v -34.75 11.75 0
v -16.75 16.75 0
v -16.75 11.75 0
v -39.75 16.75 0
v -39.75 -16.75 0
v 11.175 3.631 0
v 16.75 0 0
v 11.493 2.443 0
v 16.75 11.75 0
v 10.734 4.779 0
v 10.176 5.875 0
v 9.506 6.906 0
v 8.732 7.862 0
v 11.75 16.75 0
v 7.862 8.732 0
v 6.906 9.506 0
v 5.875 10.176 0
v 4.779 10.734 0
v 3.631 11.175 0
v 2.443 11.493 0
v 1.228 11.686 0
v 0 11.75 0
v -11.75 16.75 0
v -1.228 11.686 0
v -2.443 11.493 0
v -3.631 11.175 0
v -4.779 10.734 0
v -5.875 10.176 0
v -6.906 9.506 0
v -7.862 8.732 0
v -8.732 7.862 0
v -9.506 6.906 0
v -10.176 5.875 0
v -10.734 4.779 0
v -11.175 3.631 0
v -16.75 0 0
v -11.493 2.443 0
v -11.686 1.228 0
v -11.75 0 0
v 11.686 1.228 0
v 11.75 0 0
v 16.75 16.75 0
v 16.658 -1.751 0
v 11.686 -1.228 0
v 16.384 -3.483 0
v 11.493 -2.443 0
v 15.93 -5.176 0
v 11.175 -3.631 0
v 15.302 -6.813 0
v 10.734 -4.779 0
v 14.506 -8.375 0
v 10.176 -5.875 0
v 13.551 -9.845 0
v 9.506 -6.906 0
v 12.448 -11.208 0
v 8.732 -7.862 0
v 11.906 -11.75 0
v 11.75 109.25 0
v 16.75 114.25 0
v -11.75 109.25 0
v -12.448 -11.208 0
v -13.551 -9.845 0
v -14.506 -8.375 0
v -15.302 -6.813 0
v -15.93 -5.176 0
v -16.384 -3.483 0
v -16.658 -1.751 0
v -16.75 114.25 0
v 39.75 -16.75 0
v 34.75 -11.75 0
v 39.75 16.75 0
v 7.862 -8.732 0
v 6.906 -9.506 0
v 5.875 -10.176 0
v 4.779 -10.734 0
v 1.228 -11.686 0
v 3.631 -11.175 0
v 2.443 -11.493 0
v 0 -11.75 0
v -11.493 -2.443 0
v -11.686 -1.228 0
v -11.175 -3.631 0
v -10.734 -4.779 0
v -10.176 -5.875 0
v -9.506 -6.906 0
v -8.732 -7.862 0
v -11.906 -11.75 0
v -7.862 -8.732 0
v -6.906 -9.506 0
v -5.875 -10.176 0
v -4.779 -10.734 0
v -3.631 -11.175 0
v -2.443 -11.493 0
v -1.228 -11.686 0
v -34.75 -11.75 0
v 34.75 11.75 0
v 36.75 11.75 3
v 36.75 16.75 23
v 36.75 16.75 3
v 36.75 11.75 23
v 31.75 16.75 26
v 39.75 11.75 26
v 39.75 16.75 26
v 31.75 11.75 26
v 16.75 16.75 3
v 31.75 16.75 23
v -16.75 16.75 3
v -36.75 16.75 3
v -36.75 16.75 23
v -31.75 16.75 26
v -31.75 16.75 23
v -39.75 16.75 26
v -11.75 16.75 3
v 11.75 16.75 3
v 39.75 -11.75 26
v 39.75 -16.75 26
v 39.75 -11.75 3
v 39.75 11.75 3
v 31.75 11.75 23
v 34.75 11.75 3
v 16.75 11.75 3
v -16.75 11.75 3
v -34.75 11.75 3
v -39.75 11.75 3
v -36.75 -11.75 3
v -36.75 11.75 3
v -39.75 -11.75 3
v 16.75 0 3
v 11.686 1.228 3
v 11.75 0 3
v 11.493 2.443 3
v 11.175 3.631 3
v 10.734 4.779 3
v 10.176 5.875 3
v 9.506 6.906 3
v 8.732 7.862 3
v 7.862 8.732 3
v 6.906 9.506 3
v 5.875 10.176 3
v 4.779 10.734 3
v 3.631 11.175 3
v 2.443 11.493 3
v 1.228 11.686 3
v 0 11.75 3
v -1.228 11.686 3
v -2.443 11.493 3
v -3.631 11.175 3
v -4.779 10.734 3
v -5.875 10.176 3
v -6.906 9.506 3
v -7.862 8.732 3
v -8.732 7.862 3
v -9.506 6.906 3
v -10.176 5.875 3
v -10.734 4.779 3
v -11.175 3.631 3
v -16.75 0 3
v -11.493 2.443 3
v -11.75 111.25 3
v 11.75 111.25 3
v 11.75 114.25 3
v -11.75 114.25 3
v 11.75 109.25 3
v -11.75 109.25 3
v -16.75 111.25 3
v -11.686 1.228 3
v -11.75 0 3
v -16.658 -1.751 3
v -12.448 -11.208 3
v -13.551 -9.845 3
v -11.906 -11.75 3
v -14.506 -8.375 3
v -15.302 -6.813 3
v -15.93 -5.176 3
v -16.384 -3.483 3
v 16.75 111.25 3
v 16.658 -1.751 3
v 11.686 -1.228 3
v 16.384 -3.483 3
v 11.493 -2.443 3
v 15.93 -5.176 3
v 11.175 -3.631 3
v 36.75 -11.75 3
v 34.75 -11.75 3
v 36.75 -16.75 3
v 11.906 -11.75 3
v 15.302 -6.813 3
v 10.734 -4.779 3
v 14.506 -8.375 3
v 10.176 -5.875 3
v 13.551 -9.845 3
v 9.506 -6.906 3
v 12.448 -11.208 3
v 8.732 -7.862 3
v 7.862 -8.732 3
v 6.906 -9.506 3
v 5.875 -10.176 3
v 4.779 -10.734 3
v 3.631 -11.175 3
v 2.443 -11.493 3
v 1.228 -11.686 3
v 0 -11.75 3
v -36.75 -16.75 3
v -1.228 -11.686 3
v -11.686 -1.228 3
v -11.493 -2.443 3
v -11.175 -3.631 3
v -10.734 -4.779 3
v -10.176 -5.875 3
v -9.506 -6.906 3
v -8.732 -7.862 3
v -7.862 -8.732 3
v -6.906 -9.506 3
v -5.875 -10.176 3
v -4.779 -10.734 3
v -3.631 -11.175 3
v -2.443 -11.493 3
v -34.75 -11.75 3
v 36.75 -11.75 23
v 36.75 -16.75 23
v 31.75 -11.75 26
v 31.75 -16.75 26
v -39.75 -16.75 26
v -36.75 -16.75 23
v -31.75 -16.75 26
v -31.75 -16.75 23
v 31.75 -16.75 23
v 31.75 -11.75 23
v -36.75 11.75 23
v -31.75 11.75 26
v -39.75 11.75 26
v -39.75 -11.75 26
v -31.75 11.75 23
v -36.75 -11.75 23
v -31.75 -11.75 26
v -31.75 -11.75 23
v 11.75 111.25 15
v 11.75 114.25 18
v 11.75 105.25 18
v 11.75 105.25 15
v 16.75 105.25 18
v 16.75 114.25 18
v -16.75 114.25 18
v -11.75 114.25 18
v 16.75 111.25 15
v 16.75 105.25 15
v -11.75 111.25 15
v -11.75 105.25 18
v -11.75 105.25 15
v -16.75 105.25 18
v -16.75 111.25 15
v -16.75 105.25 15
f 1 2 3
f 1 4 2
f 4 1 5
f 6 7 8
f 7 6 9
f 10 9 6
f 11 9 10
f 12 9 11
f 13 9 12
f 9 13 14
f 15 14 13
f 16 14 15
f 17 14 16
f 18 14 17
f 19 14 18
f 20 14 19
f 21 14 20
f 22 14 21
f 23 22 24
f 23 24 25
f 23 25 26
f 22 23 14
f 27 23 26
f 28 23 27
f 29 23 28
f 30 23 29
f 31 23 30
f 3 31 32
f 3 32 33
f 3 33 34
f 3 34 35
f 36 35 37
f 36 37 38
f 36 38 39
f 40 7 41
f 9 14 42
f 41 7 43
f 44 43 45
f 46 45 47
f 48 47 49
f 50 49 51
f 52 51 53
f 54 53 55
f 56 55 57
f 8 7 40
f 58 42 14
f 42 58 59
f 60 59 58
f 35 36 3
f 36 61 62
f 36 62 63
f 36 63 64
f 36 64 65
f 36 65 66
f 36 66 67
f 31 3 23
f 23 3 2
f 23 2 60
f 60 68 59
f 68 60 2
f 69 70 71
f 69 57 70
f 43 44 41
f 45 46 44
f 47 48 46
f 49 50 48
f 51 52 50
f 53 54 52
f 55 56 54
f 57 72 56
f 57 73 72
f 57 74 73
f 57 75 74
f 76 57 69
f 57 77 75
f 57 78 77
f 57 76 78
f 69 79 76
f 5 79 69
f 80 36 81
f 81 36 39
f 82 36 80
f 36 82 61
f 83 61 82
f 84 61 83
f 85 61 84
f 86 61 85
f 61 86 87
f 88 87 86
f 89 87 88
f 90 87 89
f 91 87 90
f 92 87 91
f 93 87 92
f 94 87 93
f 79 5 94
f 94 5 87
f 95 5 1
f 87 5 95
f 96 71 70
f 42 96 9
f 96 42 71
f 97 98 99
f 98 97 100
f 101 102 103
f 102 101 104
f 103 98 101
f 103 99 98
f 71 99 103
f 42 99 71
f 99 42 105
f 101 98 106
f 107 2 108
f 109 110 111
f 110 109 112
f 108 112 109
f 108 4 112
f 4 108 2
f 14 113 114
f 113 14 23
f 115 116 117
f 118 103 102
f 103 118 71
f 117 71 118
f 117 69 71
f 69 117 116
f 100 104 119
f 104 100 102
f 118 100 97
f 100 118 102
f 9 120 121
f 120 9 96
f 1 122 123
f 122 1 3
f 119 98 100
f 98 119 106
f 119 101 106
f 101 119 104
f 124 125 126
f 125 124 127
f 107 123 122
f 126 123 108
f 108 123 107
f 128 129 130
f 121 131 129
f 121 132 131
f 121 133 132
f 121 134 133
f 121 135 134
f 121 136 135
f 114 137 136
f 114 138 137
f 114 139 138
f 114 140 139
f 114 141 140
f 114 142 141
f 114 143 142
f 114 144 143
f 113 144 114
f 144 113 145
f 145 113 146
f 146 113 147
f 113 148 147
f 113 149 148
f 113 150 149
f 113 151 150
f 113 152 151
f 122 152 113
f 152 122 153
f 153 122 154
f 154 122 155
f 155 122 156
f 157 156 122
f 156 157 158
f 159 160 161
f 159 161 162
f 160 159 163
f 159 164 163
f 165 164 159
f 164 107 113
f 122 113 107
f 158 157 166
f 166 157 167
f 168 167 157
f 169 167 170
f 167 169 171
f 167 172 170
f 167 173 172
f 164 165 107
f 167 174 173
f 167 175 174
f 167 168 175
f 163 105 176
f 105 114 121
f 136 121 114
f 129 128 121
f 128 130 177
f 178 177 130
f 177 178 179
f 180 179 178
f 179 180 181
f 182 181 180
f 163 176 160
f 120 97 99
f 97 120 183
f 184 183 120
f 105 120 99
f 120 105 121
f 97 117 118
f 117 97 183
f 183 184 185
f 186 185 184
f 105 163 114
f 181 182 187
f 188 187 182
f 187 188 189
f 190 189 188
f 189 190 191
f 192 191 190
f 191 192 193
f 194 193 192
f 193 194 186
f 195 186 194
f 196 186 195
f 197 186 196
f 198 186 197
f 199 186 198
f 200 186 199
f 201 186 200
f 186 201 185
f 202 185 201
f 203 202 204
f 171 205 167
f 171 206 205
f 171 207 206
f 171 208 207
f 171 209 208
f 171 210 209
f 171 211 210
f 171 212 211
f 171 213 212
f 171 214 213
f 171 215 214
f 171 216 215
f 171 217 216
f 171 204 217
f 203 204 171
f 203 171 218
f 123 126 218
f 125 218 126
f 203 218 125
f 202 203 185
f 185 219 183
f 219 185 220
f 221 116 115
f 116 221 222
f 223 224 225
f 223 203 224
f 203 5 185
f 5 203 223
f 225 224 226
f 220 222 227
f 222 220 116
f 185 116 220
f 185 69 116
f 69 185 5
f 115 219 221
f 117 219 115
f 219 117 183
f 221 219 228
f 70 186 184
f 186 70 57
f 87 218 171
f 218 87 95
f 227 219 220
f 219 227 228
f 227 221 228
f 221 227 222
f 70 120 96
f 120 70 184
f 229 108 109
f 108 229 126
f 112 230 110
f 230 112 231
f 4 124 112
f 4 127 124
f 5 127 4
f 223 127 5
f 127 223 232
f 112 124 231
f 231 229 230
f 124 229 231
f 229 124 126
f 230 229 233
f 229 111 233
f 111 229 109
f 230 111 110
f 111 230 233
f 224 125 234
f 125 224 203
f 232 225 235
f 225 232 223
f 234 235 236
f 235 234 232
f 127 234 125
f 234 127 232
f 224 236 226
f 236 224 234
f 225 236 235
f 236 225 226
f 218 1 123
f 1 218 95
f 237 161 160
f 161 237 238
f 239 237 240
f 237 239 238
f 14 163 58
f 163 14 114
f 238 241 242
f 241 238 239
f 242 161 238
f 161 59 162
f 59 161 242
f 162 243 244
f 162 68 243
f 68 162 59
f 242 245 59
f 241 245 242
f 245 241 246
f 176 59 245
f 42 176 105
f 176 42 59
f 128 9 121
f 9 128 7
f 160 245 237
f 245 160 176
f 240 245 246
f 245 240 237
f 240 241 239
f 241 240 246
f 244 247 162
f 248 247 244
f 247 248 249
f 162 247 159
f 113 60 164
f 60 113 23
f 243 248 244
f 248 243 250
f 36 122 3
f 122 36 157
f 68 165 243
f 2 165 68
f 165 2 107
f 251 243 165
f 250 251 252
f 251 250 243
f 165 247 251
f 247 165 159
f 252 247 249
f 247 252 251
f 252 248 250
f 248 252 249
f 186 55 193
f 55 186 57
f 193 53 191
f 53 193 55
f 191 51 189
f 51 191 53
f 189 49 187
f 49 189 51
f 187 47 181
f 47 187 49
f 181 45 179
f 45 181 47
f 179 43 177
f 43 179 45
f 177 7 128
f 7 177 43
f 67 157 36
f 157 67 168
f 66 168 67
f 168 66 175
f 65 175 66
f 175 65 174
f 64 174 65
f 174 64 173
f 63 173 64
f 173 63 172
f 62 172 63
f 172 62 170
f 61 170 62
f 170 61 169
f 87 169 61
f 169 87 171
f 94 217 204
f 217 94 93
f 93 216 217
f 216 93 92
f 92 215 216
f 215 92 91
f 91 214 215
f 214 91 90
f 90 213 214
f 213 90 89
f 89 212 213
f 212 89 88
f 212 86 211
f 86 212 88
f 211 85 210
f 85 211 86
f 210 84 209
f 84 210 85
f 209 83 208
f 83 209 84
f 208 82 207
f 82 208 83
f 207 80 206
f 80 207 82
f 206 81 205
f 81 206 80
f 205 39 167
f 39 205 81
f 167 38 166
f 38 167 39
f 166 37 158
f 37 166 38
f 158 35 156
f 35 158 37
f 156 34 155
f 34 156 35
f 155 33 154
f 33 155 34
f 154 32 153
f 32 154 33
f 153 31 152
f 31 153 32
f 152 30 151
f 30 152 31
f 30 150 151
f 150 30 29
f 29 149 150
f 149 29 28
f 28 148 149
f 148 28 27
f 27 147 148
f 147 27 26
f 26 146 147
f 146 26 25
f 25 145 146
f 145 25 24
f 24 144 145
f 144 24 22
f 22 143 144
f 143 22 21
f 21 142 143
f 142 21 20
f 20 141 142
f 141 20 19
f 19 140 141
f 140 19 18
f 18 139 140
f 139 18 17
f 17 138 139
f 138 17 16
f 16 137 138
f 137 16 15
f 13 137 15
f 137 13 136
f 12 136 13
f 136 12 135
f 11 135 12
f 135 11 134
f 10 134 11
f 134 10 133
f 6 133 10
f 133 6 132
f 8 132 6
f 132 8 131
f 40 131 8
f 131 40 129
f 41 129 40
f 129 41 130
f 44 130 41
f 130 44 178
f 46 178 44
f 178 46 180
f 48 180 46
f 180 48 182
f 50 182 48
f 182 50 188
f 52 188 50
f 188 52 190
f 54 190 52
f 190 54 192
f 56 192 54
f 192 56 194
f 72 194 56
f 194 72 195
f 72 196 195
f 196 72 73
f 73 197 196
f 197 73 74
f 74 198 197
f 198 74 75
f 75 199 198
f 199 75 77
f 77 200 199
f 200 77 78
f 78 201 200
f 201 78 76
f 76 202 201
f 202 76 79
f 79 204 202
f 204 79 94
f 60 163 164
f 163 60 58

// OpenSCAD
// Mobile Phone Holder


// General Thickness
T = 3.0;
// General Width
W = 5.0;


// Internal diameter of Circle.
Di = 23.5;
// Length of horizontal arms
A = 20.0;
// Length of bottom arms
B = 94.5;
// Height of Top holder
Ht = 20.0;
// Height of bottom holder
Hb = 12.0;
// Grapping length of top arms
Gt = 5.0;
// Grapping length of bottom bars
Gb = 6.0;
// Circle accuracy
$fn = 60;

mph();


module mph() {
  linear_extrude(T)
    difference() {
      circle(d=Di+W+W);
      circle(d=Di);
    }
  harm2();
  mirror([1,0,0])harm2();
  bot();
  mirror([1,0,0]) bot();
  translate([-Di/2-W,Di/2+W+B+T-W,0])
    linear_extrude(T)
      square([W+Di+W,W]);
    
  module bot() {
    translate([Di/2,0,0]) {
      linear_extrude(T)   square([W,Di/2+W+B+T]);
      translate([0,Di/2+W+B,0]) {
        linear_extrude(T+Hb+T)
          square([W,T]);
        translate([0,-Gb,T+Hb])
          linear_extrude(T)
            square([W,Gb+T]);
      }
    }
  }
  
  module harm2() {
    harm();
    mirror([0,1,0]) harm();
    translate([Di/2+W+A+T-W,-Di/2-W,0])
      linear_extrude(T)
        square([W,W+Di+W]);
  }
  module harm() {
    translate([0,Di/2,0]) {
      linear_extrude(T)
        square([Di/2+W+A+T,W]);
      translate([Di/2+W+A,0,0]) {
        linear_extrude(Ht+T+T)
          square([T,W]);
        translate([-Gt,0,T+Ht])
          linear_extrude(T)
            square([Gt+T,W]);
      }
    }
  }
}
// mph
